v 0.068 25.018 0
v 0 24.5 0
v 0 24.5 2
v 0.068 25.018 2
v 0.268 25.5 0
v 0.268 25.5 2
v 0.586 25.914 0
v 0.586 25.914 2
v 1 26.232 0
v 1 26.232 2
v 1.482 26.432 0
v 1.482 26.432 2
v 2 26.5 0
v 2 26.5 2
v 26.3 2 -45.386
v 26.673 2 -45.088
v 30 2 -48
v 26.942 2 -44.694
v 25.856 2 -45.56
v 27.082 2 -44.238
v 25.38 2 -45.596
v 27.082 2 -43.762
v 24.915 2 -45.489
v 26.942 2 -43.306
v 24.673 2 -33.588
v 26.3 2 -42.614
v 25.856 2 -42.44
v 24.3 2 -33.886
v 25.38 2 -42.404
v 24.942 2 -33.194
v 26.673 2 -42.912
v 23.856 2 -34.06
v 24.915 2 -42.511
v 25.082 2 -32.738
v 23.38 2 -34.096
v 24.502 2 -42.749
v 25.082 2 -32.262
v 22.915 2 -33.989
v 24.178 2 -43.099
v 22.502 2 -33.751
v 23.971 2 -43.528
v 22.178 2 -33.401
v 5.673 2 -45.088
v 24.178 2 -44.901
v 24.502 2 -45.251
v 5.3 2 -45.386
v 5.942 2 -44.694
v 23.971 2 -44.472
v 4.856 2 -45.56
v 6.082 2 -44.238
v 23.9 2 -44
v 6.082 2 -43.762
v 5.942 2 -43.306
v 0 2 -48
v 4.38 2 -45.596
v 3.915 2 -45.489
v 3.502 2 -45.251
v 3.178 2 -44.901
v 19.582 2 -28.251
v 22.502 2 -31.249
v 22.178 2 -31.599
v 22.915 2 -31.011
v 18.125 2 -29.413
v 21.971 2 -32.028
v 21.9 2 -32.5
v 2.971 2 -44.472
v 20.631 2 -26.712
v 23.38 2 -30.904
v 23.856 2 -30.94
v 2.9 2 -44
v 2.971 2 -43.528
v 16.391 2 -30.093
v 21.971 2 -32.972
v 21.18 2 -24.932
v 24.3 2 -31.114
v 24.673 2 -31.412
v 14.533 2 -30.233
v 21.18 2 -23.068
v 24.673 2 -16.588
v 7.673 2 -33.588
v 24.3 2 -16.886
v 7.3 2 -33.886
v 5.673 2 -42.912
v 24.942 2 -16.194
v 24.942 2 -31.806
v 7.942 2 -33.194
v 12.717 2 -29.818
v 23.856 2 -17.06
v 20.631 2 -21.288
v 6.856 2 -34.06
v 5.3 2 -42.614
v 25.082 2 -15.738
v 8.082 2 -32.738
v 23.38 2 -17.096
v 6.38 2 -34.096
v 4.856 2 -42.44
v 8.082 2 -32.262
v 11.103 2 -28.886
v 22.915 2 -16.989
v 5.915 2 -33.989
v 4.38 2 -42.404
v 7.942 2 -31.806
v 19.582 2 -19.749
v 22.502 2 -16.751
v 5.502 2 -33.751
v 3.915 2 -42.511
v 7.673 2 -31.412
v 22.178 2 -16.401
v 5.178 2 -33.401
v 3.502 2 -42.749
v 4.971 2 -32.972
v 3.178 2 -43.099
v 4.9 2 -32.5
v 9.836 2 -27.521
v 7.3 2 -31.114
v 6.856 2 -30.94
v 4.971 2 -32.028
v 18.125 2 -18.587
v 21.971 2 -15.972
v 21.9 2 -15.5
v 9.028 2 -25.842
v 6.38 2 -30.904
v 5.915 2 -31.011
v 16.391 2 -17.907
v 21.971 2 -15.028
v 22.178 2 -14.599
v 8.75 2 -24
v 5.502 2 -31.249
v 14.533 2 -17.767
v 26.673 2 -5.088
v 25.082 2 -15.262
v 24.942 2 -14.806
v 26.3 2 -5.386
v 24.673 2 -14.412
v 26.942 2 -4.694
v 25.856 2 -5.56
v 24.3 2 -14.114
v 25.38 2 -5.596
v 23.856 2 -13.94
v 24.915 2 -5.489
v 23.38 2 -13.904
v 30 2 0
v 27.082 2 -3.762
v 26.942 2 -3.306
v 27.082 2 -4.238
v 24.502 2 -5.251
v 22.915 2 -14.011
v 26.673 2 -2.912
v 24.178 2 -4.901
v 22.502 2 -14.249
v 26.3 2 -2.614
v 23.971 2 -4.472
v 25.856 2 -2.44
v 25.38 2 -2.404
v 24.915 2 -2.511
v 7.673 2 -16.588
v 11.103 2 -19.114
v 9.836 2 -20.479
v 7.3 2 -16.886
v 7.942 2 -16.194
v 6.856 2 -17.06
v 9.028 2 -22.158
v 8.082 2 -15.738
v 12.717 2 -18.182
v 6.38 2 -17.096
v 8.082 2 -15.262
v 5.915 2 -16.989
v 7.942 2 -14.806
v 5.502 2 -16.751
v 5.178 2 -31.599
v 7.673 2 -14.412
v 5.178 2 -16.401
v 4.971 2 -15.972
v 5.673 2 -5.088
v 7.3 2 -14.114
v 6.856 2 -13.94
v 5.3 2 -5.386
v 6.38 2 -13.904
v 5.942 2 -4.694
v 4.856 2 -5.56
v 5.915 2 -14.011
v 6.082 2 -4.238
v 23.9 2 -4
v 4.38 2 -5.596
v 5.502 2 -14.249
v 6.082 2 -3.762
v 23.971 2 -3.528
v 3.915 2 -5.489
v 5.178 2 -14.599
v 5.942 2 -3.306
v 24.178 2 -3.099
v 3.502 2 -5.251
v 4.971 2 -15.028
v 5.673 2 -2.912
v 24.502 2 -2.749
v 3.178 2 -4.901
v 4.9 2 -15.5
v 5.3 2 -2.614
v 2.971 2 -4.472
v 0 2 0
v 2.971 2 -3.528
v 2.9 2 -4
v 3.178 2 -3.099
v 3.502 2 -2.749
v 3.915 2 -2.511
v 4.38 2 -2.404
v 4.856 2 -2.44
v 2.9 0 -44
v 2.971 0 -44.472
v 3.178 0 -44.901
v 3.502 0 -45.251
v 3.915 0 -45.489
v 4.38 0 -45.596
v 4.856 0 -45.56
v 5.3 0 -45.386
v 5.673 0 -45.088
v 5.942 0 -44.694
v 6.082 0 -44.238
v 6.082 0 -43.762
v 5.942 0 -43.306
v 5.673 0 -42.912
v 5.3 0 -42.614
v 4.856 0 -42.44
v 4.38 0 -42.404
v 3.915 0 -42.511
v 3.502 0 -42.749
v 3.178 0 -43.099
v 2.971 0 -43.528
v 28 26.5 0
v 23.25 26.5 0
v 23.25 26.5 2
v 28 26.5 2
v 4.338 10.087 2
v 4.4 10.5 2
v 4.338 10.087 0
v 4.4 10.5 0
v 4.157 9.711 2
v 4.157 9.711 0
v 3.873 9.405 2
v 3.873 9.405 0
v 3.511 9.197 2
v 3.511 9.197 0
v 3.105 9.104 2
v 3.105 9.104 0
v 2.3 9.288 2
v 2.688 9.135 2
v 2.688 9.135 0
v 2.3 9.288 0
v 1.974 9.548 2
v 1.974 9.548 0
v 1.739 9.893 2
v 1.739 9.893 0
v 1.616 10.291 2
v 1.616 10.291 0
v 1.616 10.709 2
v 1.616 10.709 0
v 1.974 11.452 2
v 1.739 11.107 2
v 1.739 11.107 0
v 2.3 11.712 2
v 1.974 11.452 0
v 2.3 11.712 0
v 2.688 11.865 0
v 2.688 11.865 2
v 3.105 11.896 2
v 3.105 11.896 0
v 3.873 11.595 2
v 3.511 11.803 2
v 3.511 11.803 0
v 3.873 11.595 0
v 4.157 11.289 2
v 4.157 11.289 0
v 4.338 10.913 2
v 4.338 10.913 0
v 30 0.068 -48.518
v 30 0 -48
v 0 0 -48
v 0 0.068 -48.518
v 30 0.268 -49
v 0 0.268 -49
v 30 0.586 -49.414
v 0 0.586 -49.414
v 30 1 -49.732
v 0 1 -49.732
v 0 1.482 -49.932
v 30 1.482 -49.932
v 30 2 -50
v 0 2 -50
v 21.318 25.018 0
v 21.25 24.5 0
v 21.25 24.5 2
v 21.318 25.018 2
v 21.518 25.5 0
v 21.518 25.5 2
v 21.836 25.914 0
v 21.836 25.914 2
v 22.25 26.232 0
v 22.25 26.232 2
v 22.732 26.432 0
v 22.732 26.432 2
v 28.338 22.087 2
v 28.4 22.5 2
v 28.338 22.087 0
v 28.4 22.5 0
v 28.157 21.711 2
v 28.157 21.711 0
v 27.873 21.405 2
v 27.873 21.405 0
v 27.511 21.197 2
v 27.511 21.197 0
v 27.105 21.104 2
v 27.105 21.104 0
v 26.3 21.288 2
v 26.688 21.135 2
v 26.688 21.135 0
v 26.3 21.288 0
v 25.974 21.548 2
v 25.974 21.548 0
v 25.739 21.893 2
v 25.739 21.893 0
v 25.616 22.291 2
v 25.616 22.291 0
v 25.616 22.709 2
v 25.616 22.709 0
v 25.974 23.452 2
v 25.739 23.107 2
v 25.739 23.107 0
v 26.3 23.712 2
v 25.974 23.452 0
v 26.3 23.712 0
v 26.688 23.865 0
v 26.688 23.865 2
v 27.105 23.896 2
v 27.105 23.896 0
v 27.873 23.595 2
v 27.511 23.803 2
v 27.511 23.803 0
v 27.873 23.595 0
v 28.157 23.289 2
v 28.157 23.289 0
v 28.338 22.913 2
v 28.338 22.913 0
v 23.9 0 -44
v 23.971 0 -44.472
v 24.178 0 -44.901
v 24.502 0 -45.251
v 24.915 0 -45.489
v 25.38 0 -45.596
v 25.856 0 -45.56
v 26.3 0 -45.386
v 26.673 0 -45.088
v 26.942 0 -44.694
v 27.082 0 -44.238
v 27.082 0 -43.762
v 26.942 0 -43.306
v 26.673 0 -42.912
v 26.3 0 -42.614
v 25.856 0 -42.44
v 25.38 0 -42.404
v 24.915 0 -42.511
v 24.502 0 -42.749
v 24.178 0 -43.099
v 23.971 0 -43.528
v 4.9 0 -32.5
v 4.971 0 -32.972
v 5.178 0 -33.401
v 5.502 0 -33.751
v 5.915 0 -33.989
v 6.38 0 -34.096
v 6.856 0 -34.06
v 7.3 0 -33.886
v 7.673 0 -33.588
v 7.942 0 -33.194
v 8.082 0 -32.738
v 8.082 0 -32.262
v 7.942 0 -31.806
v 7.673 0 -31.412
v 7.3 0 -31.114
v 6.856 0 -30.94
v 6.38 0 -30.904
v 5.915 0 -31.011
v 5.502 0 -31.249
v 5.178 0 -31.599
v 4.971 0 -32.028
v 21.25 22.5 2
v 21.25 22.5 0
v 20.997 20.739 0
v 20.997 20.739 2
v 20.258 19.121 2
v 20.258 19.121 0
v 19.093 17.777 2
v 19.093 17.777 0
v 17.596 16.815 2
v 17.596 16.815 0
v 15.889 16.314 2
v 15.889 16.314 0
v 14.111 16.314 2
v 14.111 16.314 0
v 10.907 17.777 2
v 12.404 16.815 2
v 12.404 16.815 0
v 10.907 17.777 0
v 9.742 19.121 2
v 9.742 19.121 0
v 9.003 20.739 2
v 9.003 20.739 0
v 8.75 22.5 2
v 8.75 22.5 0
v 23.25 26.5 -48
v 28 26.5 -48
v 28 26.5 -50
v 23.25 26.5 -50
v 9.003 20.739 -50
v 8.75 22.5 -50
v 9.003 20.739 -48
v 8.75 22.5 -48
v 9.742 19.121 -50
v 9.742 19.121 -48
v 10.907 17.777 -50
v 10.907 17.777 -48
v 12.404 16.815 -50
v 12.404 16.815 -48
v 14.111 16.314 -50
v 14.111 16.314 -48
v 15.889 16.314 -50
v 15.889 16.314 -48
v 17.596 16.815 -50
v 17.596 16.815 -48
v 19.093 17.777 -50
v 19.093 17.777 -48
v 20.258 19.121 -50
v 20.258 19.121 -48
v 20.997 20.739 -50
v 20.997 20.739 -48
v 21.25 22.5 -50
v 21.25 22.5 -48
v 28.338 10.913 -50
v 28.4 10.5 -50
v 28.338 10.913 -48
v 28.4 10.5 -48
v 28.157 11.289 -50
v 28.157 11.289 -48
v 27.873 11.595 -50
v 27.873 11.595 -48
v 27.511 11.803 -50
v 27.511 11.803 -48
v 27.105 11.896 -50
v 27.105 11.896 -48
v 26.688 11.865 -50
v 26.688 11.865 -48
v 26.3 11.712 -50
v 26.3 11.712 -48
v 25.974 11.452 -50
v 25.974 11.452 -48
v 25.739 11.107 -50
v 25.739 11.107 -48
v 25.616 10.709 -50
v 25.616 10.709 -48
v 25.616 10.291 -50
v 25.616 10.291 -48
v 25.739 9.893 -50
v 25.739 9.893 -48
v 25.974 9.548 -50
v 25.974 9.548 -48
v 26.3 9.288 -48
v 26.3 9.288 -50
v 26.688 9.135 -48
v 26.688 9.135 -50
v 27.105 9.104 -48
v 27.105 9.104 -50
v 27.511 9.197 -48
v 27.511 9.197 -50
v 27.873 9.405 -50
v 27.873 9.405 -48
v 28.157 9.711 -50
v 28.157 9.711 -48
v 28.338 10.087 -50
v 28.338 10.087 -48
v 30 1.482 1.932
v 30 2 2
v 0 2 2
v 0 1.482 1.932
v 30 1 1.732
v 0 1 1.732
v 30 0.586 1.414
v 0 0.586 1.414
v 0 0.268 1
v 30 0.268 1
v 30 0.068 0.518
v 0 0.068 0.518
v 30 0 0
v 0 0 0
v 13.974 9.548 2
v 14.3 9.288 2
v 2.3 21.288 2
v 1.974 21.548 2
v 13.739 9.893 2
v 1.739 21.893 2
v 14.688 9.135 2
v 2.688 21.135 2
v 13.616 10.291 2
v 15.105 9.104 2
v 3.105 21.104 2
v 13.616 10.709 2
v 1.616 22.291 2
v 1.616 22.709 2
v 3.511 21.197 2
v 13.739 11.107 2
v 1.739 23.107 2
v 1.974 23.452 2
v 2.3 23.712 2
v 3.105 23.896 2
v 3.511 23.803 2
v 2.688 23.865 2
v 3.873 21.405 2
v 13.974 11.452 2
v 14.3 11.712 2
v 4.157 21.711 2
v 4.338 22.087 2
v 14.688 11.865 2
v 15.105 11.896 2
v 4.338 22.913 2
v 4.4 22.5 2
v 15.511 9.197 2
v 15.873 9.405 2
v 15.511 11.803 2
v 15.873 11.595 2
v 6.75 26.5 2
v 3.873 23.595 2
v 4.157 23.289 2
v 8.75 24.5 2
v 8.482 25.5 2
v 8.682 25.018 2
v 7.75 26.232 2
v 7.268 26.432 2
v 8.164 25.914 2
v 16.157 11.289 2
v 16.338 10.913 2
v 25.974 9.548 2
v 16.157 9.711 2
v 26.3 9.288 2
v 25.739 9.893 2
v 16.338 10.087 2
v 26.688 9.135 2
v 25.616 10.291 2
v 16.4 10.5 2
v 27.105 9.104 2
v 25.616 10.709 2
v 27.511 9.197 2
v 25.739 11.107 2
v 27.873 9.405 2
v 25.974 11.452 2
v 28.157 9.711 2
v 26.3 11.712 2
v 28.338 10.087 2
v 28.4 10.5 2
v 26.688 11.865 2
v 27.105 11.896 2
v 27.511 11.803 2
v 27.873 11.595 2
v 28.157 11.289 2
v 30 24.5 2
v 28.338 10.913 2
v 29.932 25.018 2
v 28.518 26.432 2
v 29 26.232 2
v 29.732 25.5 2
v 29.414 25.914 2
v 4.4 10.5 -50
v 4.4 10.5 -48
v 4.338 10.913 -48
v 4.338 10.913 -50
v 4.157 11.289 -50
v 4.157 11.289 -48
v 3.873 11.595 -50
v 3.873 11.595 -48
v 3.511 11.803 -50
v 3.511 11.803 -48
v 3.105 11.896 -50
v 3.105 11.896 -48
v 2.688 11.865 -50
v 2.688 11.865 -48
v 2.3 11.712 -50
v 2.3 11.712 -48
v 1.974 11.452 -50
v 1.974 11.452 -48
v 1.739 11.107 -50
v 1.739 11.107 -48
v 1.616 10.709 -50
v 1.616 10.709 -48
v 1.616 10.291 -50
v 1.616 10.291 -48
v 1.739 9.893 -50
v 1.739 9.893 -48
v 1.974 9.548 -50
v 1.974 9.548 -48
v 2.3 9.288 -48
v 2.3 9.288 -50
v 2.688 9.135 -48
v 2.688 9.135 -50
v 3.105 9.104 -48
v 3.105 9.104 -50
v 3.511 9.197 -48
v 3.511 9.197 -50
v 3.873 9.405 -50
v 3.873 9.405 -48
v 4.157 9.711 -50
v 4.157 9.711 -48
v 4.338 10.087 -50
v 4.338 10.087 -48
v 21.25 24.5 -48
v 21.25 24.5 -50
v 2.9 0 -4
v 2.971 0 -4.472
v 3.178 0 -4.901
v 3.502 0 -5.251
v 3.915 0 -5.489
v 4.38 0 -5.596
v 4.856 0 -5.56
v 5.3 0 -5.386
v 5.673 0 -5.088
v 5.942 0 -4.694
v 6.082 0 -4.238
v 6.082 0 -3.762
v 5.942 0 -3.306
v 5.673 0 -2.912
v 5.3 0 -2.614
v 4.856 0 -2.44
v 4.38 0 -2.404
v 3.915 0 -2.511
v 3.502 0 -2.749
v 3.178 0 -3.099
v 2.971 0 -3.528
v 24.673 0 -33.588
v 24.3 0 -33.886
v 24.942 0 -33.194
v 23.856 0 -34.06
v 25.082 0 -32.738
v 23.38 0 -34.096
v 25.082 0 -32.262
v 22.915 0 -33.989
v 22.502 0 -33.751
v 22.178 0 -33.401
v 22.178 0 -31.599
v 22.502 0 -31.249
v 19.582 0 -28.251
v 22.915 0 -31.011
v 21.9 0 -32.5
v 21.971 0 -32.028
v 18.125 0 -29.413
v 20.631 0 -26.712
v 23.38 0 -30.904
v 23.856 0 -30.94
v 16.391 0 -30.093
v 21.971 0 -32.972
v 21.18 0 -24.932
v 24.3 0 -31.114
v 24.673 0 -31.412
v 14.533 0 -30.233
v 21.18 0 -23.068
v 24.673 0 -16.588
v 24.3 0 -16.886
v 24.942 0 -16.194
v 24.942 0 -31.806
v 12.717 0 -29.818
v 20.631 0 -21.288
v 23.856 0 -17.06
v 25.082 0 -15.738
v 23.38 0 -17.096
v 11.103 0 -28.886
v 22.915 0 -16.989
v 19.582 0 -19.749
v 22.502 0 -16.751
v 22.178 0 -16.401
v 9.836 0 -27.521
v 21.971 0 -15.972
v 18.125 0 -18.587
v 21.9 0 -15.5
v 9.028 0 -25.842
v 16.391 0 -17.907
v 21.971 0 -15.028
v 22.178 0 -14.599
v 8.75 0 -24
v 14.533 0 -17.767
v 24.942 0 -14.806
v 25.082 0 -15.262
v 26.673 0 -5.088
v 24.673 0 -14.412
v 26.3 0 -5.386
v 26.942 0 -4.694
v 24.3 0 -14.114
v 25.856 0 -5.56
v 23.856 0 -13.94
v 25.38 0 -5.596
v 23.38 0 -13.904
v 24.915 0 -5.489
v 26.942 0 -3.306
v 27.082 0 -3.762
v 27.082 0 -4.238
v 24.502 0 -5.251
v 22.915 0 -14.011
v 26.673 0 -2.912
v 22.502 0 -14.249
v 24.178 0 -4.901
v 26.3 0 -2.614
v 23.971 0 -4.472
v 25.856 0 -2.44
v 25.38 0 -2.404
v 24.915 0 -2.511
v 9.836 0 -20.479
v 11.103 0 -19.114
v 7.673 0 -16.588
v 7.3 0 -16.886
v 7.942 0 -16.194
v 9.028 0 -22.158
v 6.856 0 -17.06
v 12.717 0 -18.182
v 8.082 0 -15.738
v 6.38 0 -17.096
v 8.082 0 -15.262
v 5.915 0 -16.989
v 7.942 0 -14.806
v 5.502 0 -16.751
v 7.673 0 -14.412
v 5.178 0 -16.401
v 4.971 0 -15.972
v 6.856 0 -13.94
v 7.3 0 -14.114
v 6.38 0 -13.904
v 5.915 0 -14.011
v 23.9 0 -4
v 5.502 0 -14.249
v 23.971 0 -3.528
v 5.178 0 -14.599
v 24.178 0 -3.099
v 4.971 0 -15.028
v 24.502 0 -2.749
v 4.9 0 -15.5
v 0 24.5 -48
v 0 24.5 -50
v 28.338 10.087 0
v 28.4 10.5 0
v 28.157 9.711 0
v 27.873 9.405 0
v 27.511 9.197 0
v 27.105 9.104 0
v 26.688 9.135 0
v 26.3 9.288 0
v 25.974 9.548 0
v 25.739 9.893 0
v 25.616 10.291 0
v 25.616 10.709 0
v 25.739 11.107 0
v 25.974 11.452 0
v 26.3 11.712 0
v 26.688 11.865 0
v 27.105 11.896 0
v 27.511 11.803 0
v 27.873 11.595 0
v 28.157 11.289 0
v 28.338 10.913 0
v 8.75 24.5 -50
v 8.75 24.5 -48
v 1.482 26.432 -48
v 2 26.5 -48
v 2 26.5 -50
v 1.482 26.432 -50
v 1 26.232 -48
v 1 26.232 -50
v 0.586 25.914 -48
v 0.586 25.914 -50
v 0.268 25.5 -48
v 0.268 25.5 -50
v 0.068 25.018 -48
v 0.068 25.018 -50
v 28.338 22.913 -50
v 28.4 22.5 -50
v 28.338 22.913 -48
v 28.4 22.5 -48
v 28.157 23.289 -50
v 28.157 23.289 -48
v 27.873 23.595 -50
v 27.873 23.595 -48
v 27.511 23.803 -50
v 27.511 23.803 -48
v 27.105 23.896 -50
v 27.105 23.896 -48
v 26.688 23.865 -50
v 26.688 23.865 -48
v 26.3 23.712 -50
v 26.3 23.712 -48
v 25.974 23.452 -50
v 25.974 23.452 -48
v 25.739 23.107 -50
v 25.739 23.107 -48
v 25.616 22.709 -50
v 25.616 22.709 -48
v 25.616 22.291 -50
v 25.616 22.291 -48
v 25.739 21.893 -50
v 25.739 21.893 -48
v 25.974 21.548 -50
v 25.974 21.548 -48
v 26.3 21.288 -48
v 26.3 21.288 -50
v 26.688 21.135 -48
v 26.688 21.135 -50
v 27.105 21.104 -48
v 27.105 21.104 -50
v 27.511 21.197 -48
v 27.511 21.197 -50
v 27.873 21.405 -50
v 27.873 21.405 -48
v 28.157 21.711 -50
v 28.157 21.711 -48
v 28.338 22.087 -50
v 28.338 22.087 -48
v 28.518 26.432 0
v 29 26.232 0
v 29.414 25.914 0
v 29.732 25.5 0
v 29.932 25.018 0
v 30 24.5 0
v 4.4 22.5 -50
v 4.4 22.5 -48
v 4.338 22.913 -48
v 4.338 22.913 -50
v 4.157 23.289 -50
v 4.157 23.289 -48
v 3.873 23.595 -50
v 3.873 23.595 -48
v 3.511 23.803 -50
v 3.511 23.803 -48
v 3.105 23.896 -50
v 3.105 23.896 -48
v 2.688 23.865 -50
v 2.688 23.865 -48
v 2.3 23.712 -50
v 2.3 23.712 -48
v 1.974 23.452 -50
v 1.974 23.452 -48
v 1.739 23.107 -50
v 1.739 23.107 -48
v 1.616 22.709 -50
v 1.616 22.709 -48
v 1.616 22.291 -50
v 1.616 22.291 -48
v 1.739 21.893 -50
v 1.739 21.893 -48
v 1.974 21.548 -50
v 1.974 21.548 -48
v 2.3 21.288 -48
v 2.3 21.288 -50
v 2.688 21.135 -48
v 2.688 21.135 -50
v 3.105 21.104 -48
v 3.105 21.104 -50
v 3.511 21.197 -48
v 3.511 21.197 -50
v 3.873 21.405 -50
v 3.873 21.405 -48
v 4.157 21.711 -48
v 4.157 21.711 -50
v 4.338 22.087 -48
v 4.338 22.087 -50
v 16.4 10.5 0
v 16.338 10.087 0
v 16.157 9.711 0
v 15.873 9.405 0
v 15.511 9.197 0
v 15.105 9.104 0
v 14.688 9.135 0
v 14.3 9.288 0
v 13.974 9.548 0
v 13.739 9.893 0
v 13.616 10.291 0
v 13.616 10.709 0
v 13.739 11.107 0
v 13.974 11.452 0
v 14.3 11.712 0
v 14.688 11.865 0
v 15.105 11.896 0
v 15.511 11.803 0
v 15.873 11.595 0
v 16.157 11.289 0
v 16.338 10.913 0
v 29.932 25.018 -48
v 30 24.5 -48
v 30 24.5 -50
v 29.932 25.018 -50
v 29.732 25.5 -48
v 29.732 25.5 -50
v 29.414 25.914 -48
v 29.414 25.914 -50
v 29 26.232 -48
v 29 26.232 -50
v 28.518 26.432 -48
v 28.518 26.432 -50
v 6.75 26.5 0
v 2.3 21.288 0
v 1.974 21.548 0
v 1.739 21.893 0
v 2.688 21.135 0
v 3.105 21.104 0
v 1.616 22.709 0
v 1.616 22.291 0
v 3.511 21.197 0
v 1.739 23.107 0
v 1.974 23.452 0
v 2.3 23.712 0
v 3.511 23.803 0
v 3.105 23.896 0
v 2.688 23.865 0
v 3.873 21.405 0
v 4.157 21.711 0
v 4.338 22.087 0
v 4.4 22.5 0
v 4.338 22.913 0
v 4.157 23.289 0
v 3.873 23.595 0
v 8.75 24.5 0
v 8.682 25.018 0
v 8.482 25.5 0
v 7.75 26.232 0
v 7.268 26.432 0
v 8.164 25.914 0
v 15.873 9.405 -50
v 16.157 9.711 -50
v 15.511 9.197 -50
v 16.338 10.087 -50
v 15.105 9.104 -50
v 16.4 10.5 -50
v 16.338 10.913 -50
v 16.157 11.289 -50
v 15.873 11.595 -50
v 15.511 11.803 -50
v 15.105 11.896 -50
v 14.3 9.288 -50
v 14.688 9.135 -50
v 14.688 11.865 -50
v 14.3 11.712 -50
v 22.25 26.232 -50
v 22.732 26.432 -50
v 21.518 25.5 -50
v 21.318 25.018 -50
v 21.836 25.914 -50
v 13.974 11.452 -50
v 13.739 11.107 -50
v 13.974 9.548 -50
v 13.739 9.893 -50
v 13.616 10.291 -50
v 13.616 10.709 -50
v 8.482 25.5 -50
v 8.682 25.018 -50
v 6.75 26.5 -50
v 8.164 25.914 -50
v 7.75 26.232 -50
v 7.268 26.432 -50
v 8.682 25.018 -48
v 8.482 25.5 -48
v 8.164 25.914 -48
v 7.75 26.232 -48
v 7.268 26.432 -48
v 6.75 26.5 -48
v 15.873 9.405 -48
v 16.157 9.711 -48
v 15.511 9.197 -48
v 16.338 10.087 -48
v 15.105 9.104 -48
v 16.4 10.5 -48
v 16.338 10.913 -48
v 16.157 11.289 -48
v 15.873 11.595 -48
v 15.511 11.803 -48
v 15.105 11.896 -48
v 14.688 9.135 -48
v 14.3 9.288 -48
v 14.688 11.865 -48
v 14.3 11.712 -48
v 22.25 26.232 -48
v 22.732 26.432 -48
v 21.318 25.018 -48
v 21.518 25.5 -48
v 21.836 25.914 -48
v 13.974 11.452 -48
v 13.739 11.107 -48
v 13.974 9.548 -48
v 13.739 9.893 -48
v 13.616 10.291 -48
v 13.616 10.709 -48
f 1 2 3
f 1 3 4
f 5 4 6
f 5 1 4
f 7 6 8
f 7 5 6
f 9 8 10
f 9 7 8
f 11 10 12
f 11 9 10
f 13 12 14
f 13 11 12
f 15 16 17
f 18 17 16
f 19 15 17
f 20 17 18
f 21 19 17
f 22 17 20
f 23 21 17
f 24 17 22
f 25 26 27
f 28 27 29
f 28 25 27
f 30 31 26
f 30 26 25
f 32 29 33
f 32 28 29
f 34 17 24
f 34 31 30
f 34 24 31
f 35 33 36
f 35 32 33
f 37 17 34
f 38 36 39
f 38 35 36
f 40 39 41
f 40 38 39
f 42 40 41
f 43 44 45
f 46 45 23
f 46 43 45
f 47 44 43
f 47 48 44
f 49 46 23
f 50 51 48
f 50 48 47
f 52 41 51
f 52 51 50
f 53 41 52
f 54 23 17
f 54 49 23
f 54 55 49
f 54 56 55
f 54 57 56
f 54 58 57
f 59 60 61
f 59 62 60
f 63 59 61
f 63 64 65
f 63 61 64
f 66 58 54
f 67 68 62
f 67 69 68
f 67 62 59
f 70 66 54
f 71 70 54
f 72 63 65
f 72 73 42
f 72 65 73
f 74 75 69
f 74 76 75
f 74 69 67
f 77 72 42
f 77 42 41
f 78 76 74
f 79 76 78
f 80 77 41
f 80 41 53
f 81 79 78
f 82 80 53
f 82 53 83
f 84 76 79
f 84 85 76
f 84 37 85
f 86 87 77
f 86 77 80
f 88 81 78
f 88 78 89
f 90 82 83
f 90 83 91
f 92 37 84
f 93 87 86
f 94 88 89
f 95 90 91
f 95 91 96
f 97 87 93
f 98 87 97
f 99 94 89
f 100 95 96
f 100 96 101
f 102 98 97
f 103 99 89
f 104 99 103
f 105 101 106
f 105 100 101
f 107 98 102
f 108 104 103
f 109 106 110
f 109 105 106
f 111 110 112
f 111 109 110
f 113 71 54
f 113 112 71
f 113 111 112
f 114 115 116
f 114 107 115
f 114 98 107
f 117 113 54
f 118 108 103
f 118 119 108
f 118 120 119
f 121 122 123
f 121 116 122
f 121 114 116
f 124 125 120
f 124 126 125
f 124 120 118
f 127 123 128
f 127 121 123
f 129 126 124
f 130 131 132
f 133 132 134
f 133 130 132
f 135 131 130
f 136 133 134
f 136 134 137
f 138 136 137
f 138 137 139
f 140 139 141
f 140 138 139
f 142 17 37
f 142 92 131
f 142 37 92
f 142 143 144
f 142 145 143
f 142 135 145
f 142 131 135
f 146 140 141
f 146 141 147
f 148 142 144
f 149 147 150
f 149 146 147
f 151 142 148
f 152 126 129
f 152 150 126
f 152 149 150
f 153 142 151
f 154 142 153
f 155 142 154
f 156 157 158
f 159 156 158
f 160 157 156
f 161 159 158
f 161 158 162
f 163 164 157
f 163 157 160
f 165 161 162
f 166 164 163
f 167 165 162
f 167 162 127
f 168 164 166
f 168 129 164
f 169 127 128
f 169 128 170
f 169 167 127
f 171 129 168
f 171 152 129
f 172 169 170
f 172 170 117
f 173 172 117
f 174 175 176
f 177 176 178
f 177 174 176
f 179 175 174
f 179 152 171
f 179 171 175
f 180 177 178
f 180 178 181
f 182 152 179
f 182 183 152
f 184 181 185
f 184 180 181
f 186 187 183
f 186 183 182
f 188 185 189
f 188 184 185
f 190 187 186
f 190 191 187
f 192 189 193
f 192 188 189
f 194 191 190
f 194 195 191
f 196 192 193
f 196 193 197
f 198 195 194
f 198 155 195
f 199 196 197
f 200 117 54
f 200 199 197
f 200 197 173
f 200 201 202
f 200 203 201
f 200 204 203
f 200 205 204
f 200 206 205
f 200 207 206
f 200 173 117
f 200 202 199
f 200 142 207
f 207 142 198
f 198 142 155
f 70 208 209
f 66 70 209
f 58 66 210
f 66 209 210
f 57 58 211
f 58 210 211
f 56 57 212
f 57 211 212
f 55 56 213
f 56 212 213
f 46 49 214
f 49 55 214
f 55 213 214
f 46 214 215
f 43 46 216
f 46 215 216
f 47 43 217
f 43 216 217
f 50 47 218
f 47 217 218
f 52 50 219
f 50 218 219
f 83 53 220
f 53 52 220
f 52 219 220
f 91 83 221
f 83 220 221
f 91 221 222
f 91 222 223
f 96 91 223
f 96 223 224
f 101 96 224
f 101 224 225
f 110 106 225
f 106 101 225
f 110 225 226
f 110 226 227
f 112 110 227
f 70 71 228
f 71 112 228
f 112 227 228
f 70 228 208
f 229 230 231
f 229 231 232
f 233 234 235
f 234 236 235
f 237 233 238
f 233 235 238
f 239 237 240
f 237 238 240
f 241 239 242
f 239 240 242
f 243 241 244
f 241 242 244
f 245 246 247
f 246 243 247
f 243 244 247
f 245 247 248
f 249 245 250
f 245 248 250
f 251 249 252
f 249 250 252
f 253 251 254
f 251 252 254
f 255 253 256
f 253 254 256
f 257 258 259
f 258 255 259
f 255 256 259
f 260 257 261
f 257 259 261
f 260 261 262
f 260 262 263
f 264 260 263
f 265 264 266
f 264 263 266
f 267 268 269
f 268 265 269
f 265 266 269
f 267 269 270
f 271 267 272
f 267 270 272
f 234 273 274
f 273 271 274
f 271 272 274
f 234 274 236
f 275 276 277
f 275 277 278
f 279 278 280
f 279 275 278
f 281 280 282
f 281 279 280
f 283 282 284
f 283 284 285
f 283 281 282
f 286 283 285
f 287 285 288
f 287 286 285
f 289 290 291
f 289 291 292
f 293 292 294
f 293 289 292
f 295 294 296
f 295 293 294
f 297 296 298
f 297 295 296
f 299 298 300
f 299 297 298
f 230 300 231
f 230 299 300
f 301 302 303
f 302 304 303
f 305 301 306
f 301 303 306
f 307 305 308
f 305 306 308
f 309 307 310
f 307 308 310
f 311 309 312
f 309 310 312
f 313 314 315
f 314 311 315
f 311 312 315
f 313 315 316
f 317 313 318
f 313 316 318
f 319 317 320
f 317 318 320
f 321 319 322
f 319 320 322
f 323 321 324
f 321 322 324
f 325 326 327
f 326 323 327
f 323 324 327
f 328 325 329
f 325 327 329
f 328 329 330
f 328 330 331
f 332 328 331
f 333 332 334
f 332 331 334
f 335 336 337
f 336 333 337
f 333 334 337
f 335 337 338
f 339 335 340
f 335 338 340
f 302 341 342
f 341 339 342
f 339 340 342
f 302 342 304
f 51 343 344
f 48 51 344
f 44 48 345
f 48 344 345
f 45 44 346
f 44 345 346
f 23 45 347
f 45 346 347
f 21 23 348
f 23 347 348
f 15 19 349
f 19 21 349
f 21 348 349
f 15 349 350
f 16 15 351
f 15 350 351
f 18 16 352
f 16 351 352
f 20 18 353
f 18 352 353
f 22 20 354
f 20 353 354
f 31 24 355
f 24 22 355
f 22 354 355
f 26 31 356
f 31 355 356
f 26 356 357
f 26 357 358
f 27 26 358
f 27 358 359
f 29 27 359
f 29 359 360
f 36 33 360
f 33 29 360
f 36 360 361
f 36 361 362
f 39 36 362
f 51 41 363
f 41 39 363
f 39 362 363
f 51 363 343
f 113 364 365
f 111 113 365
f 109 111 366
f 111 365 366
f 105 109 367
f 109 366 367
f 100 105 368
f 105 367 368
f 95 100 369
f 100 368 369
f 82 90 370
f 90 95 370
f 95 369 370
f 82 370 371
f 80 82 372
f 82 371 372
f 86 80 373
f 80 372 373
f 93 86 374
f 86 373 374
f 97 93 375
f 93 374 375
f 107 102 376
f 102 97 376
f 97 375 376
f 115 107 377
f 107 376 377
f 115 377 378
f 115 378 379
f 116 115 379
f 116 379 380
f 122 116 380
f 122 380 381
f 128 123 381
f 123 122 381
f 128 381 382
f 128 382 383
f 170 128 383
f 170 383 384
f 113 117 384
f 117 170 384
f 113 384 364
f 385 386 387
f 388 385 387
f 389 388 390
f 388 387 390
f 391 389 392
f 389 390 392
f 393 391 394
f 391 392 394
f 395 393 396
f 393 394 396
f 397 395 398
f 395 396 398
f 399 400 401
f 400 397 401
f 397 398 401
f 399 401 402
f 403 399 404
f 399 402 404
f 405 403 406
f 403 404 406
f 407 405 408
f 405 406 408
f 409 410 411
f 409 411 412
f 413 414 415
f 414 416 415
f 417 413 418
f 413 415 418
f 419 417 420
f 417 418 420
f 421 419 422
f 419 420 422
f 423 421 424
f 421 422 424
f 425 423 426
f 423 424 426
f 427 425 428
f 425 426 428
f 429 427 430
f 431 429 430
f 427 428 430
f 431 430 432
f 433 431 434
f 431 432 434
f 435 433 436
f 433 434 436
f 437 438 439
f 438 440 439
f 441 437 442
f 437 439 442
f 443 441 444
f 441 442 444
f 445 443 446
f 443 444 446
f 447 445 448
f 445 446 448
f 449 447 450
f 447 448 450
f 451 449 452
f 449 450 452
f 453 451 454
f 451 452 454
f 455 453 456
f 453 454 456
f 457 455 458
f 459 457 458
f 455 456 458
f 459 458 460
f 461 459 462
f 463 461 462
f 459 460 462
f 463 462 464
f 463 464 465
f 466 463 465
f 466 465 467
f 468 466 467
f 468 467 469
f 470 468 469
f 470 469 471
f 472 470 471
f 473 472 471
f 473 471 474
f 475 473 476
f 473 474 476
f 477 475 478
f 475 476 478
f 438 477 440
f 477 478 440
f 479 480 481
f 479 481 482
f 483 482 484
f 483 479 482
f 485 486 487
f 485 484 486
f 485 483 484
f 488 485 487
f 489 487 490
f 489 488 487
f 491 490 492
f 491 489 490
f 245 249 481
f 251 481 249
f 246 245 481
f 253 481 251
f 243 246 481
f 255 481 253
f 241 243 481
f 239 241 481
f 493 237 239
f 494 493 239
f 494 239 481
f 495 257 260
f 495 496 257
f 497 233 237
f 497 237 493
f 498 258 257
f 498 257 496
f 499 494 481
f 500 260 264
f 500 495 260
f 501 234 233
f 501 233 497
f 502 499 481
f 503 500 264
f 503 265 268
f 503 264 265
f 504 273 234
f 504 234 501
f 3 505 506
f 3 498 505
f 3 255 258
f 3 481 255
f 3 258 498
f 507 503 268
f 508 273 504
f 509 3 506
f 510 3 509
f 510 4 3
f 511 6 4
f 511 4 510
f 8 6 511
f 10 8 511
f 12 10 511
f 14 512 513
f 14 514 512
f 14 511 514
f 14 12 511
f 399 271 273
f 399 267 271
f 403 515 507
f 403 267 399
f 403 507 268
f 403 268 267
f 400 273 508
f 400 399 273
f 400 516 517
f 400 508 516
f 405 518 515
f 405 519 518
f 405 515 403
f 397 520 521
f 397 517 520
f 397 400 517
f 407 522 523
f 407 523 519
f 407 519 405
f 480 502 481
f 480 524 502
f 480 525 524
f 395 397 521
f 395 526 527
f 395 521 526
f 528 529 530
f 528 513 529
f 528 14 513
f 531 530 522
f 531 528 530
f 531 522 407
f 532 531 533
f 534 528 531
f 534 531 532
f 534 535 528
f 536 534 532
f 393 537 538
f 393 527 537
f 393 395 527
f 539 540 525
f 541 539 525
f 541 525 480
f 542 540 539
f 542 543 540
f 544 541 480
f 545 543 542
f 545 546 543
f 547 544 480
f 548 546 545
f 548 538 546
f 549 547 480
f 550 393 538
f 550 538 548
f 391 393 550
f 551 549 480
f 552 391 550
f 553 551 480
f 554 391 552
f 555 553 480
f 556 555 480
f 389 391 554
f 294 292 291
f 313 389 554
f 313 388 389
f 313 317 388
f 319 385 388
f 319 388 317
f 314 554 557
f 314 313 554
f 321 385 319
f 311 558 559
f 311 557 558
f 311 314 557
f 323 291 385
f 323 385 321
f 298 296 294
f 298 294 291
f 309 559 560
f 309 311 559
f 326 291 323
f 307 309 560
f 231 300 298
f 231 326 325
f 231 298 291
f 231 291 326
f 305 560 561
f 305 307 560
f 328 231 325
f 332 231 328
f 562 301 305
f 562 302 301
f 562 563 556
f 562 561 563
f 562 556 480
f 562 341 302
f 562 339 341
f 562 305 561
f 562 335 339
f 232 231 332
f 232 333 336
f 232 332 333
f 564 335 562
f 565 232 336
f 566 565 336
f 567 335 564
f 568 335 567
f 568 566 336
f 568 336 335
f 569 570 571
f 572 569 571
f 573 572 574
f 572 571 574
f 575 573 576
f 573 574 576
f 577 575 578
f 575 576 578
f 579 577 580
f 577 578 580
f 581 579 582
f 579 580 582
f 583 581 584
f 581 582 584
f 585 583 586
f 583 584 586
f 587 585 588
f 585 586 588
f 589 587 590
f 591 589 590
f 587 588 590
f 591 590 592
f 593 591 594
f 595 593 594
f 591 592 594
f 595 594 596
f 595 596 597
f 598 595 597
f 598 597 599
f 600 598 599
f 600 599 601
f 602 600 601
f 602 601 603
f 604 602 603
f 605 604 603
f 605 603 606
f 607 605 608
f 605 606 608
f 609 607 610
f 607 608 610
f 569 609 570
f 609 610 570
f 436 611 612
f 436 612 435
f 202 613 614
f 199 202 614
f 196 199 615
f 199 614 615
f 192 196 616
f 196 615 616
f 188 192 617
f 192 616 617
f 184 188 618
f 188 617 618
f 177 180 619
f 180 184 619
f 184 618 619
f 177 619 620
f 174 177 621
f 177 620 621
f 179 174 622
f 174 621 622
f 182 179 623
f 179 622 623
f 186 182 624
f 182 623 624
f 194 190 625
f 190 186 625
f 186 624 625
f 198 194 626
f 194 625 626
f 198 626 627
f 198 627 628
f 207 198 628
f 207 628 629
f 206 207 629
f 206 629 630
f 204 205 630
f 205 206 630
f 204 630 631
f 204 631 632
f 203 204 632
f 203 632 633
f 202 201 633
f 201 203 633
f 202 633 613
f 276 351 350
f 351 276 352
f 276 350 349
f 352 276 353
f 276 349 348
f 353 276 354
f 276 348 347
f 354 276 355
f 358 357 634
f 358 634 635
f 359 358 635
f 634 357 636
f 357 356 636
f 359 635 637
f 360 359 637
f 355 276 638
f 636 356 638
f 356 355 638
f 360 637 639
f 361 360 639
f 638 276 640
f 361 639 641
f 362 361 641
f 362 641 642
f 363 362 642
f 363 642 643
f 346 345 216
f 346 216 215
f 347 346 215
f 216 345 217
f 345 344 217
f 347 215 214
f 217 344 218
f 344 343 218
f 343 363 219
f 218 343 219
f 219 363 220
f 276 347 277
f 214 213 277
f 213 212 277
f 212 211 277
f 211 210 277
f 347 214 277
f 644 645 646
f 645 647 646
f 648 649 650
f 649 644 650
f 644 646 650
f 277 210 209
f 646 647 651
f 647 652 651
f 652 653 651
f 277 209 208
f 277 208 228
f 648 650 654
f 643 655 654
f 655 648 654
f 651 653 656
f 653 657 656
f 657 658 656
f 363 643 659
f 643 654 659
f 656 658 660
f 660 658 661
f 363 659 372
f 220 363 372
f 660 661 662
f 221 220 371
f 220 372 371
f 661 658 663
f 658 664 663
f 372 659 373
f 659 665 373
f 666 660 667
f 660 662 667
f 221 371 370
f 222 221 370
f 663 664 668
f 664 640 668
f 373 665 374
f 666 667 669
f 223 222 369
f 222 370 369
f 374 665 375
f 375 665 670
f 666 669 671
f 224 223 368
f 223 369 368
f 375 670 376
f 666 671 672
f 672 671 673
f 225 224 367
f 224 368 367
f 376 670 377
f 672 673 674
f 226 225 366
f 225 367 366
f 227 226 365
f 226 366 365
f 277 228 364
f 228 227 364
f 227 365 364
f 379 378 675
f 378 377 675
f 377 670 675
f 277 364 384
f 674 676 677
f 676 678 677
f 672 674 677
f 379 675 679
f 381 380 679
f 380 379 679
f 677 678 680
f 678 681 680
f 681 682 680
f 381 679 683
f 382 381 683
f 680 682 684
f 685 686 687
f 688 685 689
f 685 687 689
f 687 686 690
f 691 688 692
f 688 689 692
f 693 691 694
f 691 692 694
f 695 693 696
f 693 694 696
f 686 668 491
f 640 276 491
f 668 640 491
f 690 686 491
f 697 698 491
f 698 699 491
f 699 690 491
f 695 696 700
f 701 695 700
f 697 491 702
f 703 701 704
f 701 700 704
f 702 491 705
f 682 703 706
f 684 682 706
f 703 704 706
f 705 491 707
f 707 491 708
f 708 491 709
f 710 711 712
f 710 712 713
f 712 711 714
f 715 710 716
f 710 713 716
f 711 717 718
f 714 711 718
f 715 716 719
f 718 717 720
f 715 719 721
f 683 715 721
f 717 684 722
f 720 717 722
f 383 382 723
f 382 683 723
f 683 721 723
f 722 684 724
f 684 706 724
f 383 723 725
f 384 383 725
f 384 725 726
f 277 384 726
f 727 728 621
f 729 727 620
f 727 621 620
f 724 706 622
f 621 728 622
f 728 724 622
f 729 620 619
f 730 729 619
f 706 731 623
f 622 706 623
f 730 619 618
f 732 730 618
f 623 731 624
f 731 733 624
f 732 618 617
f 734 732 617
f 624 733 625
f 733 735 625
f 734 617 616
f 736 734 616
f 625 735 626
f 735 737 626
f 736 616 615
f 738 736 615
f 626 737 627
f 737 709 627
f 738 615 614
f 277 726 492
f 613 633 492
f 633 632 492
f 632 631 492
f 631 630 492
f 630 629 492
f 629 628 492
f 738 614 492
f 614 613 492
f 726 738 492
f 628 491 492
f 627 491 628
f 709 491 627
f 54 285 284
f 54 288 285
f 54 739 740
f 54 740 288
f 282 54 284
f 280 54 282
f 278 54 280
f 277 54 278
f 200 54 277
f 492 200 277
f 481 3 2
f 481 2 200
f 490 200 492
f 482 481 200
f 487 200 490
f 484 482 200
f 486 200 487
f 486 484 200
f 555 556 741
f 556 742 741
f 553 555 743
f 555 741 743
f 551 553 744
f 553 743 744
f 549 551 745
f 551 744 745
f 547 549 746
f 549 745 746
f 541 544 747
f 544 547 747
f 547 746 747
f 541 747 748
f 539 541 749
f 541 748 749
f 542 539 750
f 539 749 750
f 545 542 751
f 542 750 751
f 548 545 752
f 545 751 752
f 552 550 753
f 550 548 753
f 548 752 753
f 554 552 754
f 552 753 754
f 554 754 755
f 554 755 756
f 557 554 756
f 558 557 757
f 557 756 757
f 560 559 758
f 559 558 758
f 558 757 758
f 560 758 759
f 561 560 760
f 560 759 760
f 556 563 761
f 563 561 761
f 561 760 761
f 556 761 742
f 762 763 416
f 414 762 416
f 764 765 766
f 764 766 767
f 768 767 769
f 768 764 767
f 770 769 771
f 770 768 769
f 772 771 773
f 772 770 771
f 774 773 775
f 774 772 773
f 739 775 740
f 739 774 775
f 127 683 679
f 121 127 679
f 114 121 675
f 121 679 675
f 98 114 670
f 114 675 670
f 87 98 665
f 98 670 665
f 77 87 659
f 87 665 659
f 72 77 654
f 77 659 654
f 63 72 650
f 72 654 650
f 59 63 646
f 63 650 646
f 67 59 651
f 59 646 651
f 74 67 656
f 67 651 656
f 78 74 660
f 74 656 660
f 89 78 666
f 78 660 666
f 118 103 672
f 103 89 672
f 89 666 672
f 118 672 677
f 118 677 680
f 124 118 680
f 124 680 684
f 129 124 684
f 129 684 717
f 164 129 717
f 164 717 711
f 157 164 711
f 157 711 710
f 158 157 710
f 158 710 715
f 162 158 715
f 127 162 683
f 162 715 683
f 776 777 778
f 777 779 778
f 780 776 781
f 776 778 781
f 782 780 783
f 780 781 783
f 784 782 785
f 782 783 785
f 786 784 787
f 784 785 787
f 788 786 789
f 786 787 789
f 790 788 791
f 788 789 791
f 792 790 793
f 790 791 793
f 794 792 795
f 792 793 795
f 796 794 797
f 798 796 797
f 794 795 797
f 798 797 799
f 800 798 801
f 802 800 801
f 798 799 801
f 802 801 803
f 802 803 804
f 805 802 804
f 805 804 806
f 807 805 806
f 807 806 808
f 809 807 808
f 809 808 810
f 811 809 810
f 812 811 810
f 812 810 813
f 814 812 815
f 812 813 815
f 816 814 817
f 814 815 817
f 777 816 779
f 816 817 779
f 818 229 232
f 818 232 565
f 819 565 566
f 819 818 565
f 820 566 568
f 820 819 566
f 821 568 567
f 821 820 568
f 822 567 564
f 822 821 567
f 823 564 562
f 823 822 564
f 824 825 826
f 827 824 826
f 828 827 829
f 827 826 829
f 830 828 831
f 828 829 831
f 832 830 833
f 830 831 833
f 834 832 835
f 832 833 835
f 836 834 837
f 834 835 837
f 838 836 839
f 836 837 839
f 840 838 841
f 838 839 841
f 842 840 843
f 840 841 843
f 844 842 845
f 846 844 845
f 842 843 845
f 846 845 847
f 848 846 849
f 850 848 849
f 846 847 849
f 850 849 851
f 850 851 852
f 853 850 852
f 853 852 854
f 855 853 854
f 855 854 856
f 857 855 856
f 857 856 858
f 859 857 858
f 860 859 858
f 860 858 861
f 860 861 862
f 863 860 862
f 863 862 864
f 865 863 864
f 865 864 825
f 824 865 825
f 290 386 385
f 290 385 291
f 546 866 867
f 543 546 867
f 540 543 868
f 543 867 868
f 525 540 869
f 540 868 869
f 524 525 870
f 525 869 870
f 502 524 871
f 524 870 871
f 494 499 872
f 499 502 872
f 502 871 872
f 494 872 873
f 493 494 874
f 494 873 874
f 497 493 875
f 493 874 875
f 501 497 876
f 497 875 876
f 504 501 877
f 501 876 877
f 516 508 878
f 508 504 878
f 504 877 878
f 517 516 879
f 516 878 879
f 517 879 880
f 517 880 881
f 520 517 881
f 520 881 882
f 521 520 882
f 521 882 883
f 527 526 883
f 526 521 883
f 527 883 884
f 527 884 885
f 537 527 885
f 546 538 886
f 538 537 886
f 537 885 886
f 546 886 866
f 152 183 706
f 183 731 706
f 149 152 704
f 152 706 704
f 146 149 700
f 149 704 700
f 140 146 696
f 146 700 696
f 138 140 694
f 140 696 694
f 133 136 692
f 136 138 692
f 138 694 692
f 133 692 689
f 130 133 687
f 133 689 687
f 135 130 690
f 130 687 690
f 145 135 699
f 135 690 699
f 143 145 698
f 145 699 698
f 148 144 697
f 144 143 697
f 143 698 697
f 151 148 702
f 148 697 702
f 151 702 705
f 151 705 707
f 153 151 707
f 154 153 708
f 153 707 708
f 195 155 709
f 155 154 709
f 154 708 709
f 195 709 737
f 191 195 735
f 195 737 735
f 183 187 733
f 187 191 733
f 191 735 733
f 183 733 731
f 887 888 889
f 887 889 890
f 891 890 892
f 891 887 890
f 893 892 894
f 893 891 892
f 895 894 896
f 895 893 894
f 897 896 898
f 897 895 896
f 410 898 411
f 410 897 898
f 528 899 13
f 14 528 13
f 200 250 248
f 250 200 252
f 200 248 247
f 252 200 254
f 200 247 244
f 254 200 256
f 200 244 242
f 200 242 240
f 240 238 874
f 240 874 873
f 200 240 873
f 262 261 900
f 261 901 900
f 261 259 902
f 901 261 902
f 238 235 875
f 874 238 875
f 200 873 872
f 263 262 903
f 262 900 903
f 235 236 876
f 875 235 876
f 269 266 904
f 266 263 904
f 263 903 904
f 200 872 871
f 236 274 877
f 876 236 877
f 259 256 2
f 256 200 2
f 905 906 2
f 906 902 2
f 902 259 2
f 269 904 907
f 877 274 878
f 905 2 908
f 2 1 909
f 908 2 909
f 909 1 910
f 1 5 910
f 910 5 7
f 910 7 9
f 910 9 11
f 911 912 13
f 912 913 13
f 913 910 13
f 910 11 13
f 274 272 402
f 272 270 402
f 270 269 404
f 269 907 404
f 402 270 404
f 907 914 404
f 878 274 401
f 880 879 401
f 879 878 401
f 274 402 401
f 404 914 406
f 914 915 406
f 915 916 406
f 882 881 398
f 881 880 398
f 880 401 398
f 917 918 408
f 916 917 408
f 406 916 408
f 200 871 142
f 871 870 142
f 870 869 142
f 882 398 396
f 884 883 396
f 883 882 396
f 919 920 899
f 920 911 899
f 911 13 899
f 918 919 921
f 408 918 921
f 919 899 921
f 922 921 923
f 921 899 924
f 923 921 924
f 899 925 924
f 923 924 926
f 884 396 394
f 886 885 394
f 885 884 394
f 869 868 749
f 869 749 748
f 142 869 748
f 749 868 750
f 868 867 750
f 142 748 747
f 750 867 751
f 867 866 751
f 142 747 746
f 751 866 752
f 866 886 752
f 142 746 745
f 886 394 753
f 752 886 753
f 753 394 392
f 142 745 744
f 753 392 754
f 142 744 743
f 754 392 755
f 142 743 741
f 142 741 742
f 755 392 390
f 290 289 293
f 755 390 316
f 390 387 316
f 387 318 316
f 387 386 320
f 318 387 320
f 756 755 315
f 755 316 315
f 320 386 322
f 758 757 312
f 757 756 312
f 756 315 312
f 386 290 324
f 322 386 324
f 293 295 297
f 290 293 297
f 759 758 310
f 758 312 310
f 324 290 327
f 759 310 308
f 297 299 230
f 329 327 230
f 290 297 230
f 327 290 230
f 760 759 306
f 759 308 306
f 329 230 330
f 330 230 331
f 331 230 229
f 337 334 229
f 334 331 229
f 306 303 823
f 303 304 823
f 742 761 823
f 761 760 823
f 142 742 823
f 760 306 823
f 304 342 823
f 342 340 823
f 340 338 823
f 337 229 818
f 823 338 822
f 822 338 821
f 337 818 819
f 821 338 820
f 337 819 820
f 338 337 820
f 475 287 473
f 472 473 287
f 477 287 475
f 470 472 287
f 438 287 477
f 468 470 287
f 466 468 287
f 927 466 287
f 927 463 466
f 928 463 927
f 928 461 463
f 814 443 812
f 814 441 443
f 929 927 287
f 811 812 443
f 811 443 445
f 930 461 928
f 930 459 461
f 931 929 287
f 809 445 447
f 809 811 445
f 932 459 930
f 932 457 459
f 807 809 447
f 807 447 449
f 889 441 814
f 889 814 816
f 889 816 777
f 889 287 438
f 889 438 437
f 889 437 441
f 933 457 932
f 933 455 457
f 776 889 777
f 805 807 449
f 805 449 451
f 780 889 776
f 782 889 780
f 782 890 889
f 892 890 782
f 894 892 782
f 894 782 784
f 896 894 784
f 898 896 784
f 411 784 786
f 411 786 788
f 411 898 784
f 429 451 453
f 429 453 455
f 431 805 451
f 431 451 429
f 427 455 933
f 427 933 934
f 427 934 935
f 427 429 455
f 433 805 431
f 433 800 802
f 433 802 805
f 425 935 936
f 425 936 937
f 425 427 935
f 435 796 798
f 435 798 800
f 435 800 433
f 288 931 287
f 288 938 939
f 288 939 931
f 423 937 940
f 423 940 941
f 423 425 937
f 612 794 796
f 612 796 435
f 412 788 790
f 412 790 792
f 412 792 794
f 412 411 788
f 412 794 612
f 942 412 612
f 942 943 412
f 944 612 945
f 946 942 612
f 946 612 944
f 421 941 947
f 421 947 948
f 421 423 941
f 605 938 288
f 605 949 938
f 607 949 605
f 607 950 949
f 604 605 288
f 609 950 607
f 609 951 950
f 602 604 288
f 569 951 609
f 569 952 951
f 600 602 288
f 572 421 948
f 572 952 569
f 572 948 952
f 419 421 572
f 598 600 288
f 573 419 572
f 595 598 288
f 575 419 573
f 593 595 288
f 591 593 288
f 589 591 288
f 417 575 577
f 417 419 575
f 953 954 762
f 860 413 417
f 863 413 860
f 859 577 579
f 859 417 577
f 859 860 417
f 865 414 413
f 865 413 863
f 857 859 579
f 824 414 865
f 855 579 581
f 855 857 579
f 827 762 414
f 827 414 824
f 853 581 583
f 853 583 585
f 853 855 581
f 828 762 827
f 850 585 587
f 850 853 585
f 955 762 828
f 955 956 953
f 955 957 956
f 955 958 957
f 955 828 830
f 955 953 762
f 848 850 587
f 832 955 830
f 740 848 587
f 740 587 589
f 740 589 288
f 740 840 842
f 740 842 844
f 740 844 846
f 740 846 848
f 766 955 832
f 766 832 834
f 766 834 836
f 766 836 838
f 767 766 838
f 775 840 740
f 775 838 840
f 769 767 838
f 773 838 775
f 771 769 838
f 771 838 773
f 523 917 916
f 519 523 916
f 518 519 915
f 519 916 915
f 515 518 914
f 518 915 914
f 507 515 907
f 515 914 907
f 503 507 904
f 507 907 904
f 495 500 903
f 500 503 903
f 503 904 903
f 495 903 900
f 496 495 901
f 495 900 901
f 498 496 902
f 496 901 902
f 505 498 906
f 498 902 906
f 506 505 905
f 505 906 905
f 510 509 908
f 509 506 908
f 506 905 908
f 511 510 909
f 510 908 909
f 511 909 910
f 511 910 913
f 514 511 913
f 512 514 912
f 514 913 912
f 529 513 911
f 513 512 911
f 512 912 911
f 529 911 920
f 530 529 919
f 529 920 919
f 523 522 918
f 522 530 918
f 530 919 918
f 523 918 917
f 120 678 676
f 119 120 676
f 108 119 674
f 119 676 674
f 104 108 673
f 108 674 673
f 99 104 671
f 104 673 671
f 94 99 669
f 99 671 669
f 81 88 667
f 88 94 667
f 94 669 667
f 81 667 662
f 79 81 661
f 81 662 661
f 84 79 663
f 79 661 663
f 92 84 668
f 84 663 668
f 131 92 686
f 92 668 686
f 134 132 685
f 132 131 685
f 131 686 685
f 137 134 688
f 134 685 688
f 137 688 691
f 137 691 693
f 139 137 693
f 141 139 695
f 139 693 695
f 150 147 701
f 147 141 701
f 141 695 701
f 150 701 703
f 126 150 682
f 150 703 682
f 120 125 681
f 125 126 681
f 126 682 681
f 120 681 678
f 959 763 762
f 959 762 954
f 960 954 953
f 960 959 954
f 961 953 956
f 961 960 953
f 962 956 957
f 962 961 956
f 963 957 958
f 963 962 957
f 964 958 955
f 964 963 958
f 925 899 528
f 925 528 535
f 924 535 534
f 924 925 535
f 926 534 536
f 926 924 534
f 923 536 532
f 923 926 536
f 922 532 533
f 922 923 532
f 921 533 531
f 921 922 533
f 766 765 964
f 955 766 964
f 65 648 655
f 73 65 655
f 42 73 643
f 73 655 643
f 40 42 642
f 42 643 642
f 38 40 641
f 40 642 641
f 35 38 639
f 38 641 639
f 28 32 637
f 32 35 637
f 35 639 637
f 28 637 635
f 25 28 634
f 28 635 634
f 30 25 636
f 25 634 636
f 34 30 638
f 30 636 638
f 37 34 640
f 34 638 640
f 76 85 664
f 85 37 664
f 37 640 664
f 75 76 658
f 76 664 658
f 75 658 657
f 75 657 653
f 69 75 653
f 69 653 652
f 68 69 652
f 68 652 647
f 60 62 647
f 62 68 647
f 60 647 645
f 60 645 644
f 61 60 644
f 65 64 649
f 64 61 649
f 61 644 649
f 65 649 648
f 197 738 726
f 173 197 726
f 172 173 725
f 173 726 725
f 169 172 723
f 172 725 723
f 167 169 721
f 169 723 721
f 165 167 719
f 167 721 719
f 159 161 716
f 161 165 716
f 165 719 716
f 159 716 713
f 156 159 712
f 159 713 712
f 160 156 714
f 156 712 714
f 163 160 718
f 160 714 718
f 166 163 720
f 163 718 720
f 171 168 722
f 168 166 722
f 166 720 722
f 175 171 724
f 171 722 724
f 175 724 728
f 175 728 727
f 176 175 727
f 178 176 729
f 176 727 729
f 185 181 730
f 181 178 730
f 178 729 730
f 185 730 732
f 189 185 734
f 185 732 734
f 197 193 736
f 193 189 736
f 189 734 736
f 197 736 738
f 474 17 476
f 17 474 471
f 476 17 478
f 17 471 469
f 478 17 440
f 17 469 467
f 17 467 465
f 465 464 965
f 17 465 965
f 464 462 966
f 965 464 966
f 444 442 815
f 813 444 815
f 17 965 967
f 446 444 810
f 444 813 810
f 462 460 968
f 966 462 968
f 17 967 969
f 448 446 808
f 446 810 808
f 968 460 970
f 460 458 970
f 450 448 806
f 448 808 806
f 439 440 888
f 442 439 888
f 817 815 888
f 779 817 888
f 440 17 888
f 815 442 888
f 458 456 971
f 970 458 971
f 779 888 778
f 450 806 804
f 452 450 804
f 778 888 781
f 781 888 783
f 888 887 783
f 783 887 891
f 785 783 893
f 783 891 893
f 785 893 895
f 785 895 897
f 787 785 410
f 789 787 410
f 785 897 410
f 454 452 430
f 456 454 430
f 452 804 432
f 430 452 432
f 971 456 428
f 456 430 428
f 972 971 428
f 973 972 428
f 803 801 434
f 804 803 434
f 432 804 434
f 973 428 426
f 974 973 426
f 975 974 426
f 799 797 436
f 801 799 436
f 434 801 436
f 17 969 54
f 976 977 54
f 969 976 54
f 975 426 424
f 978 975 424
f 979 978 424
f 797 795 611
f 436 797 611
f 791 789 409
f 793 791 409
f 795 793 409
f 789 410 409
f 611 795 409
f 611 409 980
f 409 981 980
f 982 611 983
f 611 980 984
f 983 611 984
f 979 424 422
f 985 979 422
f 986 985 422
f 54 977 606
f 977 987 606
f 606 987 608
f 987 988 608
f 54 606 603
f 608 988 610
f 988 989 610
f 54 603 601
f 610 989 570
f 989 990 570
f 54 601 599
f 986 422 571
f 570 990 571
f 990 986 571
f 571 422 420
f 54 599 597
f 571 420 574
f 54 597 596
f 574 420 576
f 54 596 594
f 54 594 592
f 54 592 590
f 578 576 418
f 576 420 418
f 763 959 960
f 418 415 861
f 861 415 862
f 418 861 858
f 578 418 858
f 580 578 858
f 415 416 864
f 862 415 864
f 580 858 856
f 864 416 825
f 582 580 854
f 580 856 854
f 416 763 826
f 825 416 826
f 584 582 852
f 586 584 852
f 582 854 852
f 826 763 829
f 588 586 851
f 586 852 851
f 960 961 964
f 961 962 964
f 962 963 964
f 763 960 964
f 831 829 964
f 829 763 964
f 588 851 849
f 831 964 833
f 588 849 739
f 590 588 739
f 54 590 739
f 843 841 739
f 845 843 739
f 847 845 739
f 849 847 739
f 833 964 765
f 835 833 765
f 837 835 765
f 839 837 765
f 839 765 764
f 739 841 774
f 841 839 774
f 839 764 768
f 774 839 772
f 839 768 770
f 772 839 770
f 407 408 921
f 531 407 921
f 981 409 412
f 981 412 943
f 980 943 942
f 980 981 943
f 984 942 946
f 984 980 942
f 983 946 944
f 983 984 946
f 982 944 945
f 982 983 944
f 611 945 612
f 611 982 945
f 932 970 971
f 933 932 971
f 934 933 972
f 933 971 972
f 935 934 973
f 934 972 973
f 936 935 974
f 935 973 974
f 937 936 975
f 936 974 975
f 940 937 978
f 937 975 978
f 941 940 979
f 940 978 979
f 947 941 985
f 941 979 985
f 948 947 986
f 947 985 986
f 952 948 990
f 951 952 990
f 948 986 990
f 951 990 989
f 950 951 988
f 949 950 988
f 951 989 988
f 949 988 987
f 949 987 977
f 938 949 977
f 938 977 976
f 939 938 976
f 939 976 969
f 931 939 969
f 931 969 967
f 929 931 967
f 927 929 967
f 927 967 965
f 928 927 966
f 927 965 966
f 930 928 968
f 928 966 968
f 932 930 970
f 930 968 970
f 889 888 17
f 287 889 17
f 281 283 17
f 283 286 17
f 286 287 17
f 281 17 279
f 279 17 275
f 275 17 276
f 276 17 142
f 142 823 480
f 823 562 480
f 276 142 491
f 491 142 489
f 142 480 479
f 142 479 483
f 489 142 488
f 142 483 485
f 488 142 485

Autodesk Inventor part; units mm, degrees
ref_plane "YZ Plane" through (0, 0, 0) normal (1, 0, 0) x (0, 1, 0)
ref_plane "XZ Plane" through (0, 0, 0) normal (0, 1, 0) x (-1, 0, 0)
ref_plane "XY Plane" through (0, 0, 0) normal (0, 0, 1) x (1, 0, 0)
sketch "Sketch1" plane through (0, 0, 0) normal (0, 1, 0) x (-1, 0, 0)
  line L0 (0, 0) -> (-30, 0)
  line L1 (-30, 0) -> (-30, -48)
  line L2 (-30, -48) -> (0, -48)
  line L3 (0, -48) -> (0, 0)
  circle A0 centre (-15, -24) radius 6.25
  circle A1 centre (-23.5, -32.5) radius 1.6
  circle A2 centre (-6.5, -32.5) radius 1.6
  circle A3 centre (-4.5, -44) radius 1.6
  circle A4 centre (-25.5, -44) radius 1.6
  circle A5 centre (-23.5, -15.5) radius 1.6
  circle A6 centre (-6.5, -15.5) radius 1.6
  circle A7 centre (-4.5, -4) radius 1.6
  circle A8 centre (-25.5, -4) radius 1.6
  line L4 (-4.5, -44) -> (-25.5, -44) construction
  line L5 (-25.5, -44) -> (-25.5, -4) construction
  line L6 (-6.5, -32.5) -> (-23.5, -32.5) construction
  line L7 (-23.5, -32.5) -> (-23.5, -15.5) construction
  point P0 (0, -24)
  point P1 (-15, -48)
  point P2 (-23.5, -24)
  point P3 (-30, -24)
  point P4 (-25.5, -24)
  point P5 (-15, -32.5)
  point P6 (-15, -44)
  dimension "d0" = 30
  dimension "d1" = 48
  dimension "d2" = 12.5
  dimension "d3" = 3.2
  dimension "d4" = 17
  dimension "d5" = 17
  dimension "d6" = 40
  dimension "d7" = 21
extrude "Extrusion1" add sketch "Sketch1" along normal blind 2
sketch "Sketch2" plane through (0, 0, 0) normal (0, 0, 1) x (1, 0, 0)
  line L0 (0, 0) -> (30, 0) construction
  line L1 (0, 0) -> (0, 24.5)
  line L2 (30, 0) -> (30, 24.5)
  arc A0 (8.75, 22.5) -> (21.25, 22.5) centre (15, 22.5) ccw
  line L3 (21.25, 22.5) -> (21.25, 24.5)
  line L4 (23.25, 26.5) -> (28, 26.5)
  line L5 (8.75, 22.5) -> (8.75, 24.5)
  line L6 (6.75, 26.5) -> (2, 26.5)
  arc A1 (8.75, 24.5) -> (6.75, 26.5) centre (6.75, 24.5) ccw
  arc A2 (2, 26.5) -> (0, 24.5) centre (2, 24.5) ccw
  arc A3 (30, 24.5) -> (28, 26.5) centre (28, 24.5) ccw
  arc A4 (23.25, 26.5) -> (21.25, 24.5) centre (23.25, 24.5) ccw
  circle A5 centre (27, 22.5) radius 1.4
  circle A6 centre (27, 10.5) radius 1.4
  circle A7 centre (15, 10.5) radius 1.4
  circle A8 centre (3, 10.5) radius 1.4
  circle A9 centre (3, 22.5) radius 1.4
  line L7 (3, 10.5) -> (27, 10.5) construction
  line L8 (0, 0) -> (30, 0)
  point P0 (0, 26.5)
  point P1 (30, 26.5)
  point P2 (15, 0)
  point P3 (15, 0)
  point P4 (15, 0)
  dimension "d10" = 26.5
  dimension "d11" = 26.5
  dimension "d12" = 12.5
  dimension "d13" = 22.5
  dimension "d14" = 2
  dimension "d15" = 2.8
  dimension "d16" = 12
  dimension "d17" = 24
extrude "Extrusion2" add sketch "Sketch2" along normal blind 2
fillet "Fillet1" radius 2 1 edges at (15, 0, 2)
ref_plane "Work Plane1" through (0, 0, -24) normal (0, 0, -1) x (-1, 0, 0)
sketch "Sketch3" plane through (0, 0, -24) normal (0, 0, -1) x (-1, 0, 0)
  point P0 (0, 0)
mirror "Mirror1" about plane through (0, 0, -24) normal (0, 0, -1) of "Extrusion2", "Fillet1"
properties part number "SmallerBracket"
